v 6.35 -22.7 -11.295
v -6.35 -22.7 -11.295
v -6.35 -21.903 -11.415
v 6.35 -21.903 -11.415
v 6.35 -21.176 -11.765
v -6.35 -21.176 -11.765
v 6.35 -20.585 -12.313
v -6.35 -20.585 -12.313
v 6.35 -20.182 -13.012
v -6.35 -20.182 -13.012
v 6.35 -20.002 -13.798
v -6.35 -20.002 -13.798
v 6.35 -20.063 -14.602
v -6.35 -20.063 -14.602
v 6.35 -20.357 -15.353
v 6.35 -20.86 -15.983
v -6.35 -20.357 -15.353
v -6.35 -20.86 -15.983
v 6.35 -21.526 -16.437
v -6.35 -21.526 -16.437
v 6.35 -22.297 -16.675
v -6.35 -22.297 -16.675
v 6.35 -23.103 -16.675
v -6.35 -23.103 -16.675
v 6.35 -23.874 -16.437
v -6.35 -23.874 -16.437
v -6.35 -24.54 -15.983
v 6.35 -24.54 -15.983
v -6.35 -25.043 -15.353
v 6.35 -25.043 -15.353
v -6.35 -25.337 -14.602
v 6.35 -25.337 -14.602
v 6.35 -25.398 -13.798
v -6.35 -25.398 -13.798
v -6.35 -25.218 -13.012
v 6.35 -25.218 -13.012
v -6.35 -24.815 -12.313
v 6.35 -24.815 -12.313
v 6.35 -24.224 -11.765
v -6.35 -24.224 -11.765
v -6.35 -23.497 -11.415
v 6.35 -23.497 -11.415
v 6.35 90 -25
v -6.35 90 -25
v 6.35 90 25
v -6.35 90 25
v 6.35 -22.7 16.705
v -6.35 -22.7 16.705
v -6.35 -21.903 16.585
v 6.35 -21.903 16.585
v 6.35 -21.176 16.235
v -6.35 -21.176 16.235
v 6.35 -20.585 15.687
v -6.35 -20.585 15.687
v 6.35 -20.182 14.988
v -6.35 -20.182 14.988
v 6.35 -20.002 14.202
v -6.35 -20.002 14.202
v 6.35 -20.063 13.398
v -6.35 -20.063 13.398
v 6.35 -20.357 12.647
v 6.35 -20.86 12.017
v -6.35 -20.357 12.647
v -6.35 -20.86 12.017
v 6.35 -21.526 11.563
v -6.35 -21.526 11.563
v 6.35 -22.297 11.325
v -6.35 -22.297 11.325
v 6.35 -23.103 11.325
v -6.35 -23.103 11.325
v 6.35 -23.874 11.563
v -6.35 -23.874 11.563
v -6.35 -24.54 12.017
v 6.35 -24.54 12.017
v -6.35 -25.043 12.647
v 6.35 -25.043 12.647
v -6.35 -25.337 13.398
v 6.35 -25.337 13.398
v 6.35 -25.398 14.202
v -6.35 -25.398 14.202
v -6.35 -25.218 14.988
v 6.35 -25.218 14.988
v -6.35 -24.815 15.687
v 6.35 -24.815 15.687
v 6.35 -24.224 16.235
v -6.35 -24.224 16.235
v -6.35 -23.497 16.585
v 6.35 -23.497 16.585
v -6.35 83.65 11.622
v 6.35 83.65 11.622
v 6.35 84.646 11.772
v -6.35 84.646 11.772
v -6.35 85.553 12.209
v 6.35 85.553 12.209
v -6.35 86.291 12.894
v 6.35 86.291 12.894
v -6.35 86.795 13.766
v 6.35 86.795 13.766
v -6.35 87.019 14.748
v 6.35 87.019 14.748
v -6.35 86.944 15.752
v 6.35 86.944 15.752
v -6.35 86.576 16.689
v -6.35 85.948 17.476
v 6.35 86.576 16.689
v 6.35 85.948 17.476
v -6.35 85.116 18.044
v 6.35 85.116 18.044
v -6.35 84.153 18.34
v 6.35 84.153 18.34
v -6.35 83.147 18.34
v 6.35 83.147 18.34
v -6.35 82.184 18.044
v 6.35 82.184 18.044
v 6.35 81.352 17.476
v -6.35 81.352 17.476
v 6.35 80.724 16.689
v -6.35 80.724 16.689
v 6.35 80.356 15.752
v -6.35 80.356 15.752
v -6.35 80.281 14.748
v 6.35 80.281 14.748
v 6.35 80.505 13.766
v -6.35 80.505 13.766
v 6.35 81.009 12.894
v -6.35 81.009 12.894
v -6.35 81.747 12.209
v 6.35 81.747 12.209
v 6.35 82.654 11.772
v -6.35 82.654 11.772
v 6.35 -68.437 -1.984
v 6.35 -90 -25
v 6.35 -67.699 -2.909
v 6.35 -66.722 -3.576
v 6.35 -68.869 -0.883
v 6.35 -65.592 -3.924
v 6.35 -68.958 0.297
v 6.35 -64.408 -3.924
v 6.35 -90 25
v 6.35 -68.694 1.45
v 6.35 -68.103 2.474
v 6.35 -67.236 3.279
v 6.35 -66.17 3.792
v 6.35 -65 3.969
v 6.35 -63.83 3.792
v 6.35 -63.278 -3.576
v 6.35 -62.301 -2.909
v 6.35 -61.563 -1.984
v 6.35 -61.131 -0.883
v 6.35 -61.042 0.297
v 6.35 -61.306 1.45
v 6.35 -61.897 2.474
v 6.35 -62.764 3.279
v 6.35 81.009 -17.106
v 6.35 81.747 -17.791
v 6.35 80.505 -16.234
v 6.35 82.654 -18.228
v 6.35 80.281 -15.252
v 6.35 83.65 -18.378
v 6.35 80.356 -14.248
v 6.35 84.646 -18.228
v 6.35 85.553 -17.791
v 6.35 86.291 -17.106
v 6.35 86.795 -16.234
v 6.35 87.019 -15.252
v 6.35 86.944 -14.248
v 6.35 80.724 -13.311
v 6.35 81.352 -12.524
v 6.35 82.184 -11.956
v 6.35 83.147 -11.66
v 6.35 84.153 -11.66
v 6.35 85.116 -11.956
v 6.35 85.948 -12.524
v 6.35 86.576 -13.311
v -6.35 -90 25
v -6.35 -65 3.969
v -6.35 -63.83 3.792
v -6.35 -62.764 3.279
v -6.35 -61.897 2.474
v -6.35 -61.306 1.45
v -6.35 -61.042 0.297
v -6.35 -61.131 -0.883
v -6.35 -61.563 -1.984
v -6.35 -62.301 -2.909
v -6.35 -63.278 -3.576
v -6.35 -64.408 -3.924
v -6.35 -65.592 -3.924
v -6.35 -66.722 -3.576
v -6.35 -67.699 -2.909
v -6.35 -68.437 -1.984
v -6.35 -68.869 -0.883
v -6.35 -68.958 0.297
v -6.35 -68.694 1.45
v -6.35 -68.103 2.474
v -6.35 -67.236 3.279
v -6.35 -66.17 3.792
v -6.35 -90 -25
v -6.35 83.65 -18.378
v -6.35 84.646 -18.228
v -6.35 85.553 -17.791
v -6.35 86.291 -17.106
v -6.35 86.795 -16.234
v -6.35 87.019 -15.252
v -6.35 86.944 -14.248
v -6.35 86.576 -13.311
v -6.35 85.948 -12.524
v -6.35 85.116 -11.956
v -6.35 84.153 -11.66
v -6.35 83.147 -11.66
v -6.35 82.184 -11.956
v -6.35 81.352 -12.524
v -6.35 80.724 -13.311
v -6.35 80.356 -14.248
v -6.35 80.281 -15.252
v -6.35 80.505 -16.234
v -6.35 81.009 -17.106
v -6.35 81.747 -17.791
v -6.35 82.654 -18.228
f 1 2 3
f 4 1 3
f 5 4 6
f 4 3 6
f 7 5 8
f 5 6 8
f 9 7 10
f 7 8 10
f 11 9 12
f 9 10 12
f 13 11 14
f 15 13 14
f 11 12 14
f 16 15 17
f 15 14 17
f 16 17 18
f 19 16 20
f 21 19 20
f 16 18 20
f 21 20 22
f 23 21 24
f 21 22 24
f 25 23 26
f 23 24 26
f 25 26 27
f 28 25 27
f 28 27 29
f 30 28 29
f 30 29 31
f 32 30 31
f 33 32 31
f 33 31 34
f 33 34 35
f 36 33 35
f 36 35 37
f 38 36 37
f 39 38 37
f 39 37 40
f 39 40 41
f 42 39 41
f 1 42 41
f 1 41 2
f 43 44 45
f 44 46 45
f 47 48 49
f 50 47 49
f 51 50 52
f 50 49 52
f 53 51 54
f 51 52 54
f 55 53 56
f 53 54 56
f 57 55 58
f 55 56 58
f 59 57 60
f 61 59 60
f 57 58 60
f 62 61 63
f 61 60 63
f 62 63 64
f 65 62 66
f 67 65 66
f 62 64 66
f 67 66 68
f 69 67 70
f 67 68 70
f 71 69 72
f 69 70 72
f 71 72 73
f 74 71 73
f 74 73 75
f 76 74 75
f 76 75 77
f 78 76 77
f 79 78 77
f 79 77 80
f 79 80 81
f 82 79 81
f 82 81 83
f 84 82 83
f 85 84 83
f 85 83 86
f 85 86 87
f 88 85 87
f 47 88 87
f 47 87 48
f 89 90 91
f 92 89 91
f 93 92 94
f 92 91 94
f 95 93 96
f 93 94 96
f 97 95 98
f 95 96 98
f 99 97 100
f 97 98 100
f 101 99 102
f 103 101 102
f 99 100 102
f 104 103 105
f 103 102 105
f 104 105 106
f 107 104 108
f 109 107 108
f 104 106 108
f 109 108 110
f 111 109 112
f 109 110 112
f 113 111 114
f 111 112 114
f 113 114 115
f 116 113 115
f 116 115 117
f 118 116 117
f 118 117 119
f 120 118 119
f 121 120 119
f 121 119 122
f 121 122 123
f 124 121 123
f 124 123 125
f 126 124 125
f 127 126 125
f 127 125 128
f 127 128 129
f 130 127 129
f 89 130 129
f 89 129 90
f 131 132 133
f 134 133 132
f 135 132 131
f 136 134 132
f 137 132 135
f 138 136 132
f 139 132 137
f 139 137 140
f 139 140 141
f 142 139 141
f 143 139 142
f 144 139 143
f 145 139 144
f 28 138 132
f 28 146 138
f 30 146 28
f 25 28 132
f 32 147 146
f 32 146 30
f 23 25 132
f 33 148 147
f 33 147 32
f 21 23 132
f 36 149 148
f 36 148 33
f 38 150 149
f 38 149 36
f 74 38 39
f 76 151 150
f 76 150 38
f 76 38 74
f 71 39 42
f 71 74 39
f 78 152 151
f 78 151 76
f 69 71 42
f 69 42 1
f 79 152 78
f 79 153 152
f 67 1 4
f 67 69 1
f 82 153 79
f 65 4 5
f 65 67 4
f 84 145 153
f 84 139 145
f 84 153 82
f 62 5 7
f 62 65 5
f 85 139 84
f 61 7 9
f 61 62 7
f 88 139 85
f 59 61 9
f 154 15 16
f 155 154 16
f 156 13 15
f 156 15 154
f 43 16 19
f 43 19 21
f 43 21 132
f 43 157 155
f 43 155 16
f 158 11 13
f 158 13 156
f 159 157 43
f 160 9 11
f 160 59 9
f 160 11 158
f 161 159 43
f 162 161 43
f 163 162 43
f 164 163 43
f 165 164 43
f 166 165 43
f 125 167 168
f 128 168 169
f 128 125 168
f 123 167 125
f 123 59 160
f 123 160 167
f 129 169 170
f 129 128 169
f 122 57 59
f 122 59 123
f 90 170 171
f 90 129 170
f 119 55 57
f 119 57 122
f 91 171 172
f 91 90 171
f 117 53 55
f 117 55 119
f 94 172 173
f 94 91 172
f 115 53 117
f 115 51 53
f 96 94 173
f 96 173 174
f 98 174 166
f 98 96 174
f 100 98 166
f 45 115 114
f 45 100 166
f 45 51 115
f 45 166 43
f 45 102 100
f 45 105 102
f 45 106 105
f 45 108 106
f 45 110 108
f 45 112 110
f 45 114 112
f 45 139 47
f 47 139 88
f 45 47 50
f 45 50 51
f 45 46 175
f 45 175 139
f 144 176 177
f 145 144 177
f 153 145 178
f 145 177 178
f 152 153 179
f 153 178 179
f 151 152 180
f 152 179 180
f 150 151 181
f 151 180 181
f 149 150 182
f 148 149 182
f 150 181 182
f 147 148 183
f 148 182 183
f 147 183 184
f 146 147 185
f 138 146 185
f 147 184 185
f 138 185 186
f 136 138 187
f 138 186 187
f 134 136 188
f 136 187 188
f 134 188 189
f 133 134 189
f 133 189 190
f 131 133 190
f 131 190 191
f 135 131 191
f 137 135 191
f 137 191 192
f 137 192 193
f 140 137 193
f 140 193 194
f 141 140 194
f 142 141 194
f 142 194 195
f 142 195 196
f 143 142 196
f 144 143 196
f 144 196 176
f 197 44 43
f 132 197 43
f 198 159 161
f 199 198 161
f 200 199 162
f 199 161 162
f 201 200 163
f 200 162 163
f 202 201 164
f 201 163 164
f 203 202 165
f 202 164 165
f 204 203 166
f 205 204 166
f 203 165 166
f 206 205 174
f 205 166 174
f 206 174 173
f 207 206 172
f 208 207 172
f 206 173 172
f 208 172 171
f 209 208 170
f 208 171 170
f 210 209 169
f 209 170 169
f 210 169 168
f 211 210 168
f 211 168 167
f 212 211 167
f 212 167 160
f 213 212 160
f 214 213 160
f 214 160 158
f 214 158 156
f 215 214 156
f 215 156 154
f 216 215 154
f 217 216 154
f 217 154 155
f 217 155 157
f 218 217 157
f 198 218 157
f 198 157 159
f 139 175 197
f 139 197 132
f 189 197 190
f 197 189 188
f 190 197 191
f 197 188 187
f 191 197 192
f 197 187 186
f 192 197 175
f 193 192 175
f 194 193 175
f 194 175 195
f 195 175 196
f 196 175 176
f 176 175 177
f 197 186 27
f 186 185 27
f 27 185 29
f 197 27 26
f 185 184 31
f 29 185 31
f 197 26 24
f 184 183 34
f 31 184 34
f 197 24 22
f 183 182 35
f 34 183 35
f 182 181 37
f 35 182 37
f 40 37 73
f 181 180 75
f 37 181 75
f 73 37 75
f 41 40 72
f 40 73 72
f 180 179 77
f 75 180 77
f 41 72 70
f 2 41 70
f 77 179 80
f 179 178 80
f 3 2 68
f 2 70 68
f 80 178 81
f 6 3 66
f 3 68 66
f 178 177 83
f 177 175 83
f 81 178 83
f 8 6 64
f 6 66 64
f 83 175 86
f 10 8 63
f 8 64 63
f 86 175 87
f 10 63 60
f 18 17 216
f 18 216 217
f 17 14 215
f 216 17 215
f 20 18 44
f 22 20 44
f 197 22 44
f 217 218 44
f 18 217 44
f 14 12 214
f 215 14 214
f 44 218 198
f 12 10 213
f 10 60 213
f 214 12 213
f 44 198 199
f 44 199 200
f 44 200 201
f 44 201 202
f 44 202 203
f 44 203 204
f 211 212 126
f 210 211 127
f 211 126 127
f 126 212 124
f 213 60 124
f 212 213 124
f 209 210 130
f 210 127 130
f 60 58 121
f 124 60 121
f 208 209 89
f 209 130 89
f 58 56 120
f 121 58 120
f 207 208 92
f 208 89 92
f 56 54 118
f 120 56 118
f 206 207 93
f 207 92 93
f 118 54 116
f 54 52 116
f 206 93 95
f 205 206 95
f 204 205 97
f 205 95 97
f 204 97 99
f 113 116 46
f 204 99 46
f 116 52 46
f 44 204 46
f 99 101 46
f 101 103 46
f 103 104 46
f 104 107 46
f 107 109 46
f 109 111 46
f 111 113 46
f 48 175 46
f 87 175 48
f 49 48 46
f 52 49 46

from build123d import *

# Parameters (mm, degrees)
CROQUIS1_W                    = 12.7
CROQUIS1_H                    = 180
SALIENTE_EXTRUIR1_DEPTH       = 25
TALADRO_ROSCADO_3_8_161_D     = 7.9375
TALADRO_DE_MARGEN_PARA_1_41_D = 6.7564
TALADRO_ROSCADO_1_4_281_D     = 5.4102


with BuildPart() as part:
    # Croquis1 → Saliente-Extruir1 (new, symmetric)
    with BuildSketch(Plane.XY):
        Rectangle(CROQUIS1_W, CROQUIS1_H)
    extrude(amount=SALIENTE_EXTRUIR1_DEPTH, both=True)

    # Taladro roscado 3/8-161 (through all)
    with Locations(Plane(origin=(6.35, 0, 0), x_dir=(0, 0, -1), z_dir=(1, 0, 0))):
        with Locations((0, -65)):
            Hole(TALADRO_ROSCADO_3_8_161_D / 2)

    # Taladro de margen para 1/41 (through all)
    with Locations(Plane.ZY.offset(6.35)):
        with Locations((-15, 83.65), (15, 83.65)):
            Hole(TALADRO_DE_MARGEN_PARA_1_41_D / 2)

    # Taladro roscado 1/4-281 (through all)
    with Locations(Plane(origin=(6.35, 0, 0), x_dir=(0, 0, -1), z_dir=(1, 0, 0))):
        with Locations((14, -22.7), (-14, -22.7)):
            Hole(TALADRO_ROSCADO_1_4_281_D / 2)


solid = part.part
